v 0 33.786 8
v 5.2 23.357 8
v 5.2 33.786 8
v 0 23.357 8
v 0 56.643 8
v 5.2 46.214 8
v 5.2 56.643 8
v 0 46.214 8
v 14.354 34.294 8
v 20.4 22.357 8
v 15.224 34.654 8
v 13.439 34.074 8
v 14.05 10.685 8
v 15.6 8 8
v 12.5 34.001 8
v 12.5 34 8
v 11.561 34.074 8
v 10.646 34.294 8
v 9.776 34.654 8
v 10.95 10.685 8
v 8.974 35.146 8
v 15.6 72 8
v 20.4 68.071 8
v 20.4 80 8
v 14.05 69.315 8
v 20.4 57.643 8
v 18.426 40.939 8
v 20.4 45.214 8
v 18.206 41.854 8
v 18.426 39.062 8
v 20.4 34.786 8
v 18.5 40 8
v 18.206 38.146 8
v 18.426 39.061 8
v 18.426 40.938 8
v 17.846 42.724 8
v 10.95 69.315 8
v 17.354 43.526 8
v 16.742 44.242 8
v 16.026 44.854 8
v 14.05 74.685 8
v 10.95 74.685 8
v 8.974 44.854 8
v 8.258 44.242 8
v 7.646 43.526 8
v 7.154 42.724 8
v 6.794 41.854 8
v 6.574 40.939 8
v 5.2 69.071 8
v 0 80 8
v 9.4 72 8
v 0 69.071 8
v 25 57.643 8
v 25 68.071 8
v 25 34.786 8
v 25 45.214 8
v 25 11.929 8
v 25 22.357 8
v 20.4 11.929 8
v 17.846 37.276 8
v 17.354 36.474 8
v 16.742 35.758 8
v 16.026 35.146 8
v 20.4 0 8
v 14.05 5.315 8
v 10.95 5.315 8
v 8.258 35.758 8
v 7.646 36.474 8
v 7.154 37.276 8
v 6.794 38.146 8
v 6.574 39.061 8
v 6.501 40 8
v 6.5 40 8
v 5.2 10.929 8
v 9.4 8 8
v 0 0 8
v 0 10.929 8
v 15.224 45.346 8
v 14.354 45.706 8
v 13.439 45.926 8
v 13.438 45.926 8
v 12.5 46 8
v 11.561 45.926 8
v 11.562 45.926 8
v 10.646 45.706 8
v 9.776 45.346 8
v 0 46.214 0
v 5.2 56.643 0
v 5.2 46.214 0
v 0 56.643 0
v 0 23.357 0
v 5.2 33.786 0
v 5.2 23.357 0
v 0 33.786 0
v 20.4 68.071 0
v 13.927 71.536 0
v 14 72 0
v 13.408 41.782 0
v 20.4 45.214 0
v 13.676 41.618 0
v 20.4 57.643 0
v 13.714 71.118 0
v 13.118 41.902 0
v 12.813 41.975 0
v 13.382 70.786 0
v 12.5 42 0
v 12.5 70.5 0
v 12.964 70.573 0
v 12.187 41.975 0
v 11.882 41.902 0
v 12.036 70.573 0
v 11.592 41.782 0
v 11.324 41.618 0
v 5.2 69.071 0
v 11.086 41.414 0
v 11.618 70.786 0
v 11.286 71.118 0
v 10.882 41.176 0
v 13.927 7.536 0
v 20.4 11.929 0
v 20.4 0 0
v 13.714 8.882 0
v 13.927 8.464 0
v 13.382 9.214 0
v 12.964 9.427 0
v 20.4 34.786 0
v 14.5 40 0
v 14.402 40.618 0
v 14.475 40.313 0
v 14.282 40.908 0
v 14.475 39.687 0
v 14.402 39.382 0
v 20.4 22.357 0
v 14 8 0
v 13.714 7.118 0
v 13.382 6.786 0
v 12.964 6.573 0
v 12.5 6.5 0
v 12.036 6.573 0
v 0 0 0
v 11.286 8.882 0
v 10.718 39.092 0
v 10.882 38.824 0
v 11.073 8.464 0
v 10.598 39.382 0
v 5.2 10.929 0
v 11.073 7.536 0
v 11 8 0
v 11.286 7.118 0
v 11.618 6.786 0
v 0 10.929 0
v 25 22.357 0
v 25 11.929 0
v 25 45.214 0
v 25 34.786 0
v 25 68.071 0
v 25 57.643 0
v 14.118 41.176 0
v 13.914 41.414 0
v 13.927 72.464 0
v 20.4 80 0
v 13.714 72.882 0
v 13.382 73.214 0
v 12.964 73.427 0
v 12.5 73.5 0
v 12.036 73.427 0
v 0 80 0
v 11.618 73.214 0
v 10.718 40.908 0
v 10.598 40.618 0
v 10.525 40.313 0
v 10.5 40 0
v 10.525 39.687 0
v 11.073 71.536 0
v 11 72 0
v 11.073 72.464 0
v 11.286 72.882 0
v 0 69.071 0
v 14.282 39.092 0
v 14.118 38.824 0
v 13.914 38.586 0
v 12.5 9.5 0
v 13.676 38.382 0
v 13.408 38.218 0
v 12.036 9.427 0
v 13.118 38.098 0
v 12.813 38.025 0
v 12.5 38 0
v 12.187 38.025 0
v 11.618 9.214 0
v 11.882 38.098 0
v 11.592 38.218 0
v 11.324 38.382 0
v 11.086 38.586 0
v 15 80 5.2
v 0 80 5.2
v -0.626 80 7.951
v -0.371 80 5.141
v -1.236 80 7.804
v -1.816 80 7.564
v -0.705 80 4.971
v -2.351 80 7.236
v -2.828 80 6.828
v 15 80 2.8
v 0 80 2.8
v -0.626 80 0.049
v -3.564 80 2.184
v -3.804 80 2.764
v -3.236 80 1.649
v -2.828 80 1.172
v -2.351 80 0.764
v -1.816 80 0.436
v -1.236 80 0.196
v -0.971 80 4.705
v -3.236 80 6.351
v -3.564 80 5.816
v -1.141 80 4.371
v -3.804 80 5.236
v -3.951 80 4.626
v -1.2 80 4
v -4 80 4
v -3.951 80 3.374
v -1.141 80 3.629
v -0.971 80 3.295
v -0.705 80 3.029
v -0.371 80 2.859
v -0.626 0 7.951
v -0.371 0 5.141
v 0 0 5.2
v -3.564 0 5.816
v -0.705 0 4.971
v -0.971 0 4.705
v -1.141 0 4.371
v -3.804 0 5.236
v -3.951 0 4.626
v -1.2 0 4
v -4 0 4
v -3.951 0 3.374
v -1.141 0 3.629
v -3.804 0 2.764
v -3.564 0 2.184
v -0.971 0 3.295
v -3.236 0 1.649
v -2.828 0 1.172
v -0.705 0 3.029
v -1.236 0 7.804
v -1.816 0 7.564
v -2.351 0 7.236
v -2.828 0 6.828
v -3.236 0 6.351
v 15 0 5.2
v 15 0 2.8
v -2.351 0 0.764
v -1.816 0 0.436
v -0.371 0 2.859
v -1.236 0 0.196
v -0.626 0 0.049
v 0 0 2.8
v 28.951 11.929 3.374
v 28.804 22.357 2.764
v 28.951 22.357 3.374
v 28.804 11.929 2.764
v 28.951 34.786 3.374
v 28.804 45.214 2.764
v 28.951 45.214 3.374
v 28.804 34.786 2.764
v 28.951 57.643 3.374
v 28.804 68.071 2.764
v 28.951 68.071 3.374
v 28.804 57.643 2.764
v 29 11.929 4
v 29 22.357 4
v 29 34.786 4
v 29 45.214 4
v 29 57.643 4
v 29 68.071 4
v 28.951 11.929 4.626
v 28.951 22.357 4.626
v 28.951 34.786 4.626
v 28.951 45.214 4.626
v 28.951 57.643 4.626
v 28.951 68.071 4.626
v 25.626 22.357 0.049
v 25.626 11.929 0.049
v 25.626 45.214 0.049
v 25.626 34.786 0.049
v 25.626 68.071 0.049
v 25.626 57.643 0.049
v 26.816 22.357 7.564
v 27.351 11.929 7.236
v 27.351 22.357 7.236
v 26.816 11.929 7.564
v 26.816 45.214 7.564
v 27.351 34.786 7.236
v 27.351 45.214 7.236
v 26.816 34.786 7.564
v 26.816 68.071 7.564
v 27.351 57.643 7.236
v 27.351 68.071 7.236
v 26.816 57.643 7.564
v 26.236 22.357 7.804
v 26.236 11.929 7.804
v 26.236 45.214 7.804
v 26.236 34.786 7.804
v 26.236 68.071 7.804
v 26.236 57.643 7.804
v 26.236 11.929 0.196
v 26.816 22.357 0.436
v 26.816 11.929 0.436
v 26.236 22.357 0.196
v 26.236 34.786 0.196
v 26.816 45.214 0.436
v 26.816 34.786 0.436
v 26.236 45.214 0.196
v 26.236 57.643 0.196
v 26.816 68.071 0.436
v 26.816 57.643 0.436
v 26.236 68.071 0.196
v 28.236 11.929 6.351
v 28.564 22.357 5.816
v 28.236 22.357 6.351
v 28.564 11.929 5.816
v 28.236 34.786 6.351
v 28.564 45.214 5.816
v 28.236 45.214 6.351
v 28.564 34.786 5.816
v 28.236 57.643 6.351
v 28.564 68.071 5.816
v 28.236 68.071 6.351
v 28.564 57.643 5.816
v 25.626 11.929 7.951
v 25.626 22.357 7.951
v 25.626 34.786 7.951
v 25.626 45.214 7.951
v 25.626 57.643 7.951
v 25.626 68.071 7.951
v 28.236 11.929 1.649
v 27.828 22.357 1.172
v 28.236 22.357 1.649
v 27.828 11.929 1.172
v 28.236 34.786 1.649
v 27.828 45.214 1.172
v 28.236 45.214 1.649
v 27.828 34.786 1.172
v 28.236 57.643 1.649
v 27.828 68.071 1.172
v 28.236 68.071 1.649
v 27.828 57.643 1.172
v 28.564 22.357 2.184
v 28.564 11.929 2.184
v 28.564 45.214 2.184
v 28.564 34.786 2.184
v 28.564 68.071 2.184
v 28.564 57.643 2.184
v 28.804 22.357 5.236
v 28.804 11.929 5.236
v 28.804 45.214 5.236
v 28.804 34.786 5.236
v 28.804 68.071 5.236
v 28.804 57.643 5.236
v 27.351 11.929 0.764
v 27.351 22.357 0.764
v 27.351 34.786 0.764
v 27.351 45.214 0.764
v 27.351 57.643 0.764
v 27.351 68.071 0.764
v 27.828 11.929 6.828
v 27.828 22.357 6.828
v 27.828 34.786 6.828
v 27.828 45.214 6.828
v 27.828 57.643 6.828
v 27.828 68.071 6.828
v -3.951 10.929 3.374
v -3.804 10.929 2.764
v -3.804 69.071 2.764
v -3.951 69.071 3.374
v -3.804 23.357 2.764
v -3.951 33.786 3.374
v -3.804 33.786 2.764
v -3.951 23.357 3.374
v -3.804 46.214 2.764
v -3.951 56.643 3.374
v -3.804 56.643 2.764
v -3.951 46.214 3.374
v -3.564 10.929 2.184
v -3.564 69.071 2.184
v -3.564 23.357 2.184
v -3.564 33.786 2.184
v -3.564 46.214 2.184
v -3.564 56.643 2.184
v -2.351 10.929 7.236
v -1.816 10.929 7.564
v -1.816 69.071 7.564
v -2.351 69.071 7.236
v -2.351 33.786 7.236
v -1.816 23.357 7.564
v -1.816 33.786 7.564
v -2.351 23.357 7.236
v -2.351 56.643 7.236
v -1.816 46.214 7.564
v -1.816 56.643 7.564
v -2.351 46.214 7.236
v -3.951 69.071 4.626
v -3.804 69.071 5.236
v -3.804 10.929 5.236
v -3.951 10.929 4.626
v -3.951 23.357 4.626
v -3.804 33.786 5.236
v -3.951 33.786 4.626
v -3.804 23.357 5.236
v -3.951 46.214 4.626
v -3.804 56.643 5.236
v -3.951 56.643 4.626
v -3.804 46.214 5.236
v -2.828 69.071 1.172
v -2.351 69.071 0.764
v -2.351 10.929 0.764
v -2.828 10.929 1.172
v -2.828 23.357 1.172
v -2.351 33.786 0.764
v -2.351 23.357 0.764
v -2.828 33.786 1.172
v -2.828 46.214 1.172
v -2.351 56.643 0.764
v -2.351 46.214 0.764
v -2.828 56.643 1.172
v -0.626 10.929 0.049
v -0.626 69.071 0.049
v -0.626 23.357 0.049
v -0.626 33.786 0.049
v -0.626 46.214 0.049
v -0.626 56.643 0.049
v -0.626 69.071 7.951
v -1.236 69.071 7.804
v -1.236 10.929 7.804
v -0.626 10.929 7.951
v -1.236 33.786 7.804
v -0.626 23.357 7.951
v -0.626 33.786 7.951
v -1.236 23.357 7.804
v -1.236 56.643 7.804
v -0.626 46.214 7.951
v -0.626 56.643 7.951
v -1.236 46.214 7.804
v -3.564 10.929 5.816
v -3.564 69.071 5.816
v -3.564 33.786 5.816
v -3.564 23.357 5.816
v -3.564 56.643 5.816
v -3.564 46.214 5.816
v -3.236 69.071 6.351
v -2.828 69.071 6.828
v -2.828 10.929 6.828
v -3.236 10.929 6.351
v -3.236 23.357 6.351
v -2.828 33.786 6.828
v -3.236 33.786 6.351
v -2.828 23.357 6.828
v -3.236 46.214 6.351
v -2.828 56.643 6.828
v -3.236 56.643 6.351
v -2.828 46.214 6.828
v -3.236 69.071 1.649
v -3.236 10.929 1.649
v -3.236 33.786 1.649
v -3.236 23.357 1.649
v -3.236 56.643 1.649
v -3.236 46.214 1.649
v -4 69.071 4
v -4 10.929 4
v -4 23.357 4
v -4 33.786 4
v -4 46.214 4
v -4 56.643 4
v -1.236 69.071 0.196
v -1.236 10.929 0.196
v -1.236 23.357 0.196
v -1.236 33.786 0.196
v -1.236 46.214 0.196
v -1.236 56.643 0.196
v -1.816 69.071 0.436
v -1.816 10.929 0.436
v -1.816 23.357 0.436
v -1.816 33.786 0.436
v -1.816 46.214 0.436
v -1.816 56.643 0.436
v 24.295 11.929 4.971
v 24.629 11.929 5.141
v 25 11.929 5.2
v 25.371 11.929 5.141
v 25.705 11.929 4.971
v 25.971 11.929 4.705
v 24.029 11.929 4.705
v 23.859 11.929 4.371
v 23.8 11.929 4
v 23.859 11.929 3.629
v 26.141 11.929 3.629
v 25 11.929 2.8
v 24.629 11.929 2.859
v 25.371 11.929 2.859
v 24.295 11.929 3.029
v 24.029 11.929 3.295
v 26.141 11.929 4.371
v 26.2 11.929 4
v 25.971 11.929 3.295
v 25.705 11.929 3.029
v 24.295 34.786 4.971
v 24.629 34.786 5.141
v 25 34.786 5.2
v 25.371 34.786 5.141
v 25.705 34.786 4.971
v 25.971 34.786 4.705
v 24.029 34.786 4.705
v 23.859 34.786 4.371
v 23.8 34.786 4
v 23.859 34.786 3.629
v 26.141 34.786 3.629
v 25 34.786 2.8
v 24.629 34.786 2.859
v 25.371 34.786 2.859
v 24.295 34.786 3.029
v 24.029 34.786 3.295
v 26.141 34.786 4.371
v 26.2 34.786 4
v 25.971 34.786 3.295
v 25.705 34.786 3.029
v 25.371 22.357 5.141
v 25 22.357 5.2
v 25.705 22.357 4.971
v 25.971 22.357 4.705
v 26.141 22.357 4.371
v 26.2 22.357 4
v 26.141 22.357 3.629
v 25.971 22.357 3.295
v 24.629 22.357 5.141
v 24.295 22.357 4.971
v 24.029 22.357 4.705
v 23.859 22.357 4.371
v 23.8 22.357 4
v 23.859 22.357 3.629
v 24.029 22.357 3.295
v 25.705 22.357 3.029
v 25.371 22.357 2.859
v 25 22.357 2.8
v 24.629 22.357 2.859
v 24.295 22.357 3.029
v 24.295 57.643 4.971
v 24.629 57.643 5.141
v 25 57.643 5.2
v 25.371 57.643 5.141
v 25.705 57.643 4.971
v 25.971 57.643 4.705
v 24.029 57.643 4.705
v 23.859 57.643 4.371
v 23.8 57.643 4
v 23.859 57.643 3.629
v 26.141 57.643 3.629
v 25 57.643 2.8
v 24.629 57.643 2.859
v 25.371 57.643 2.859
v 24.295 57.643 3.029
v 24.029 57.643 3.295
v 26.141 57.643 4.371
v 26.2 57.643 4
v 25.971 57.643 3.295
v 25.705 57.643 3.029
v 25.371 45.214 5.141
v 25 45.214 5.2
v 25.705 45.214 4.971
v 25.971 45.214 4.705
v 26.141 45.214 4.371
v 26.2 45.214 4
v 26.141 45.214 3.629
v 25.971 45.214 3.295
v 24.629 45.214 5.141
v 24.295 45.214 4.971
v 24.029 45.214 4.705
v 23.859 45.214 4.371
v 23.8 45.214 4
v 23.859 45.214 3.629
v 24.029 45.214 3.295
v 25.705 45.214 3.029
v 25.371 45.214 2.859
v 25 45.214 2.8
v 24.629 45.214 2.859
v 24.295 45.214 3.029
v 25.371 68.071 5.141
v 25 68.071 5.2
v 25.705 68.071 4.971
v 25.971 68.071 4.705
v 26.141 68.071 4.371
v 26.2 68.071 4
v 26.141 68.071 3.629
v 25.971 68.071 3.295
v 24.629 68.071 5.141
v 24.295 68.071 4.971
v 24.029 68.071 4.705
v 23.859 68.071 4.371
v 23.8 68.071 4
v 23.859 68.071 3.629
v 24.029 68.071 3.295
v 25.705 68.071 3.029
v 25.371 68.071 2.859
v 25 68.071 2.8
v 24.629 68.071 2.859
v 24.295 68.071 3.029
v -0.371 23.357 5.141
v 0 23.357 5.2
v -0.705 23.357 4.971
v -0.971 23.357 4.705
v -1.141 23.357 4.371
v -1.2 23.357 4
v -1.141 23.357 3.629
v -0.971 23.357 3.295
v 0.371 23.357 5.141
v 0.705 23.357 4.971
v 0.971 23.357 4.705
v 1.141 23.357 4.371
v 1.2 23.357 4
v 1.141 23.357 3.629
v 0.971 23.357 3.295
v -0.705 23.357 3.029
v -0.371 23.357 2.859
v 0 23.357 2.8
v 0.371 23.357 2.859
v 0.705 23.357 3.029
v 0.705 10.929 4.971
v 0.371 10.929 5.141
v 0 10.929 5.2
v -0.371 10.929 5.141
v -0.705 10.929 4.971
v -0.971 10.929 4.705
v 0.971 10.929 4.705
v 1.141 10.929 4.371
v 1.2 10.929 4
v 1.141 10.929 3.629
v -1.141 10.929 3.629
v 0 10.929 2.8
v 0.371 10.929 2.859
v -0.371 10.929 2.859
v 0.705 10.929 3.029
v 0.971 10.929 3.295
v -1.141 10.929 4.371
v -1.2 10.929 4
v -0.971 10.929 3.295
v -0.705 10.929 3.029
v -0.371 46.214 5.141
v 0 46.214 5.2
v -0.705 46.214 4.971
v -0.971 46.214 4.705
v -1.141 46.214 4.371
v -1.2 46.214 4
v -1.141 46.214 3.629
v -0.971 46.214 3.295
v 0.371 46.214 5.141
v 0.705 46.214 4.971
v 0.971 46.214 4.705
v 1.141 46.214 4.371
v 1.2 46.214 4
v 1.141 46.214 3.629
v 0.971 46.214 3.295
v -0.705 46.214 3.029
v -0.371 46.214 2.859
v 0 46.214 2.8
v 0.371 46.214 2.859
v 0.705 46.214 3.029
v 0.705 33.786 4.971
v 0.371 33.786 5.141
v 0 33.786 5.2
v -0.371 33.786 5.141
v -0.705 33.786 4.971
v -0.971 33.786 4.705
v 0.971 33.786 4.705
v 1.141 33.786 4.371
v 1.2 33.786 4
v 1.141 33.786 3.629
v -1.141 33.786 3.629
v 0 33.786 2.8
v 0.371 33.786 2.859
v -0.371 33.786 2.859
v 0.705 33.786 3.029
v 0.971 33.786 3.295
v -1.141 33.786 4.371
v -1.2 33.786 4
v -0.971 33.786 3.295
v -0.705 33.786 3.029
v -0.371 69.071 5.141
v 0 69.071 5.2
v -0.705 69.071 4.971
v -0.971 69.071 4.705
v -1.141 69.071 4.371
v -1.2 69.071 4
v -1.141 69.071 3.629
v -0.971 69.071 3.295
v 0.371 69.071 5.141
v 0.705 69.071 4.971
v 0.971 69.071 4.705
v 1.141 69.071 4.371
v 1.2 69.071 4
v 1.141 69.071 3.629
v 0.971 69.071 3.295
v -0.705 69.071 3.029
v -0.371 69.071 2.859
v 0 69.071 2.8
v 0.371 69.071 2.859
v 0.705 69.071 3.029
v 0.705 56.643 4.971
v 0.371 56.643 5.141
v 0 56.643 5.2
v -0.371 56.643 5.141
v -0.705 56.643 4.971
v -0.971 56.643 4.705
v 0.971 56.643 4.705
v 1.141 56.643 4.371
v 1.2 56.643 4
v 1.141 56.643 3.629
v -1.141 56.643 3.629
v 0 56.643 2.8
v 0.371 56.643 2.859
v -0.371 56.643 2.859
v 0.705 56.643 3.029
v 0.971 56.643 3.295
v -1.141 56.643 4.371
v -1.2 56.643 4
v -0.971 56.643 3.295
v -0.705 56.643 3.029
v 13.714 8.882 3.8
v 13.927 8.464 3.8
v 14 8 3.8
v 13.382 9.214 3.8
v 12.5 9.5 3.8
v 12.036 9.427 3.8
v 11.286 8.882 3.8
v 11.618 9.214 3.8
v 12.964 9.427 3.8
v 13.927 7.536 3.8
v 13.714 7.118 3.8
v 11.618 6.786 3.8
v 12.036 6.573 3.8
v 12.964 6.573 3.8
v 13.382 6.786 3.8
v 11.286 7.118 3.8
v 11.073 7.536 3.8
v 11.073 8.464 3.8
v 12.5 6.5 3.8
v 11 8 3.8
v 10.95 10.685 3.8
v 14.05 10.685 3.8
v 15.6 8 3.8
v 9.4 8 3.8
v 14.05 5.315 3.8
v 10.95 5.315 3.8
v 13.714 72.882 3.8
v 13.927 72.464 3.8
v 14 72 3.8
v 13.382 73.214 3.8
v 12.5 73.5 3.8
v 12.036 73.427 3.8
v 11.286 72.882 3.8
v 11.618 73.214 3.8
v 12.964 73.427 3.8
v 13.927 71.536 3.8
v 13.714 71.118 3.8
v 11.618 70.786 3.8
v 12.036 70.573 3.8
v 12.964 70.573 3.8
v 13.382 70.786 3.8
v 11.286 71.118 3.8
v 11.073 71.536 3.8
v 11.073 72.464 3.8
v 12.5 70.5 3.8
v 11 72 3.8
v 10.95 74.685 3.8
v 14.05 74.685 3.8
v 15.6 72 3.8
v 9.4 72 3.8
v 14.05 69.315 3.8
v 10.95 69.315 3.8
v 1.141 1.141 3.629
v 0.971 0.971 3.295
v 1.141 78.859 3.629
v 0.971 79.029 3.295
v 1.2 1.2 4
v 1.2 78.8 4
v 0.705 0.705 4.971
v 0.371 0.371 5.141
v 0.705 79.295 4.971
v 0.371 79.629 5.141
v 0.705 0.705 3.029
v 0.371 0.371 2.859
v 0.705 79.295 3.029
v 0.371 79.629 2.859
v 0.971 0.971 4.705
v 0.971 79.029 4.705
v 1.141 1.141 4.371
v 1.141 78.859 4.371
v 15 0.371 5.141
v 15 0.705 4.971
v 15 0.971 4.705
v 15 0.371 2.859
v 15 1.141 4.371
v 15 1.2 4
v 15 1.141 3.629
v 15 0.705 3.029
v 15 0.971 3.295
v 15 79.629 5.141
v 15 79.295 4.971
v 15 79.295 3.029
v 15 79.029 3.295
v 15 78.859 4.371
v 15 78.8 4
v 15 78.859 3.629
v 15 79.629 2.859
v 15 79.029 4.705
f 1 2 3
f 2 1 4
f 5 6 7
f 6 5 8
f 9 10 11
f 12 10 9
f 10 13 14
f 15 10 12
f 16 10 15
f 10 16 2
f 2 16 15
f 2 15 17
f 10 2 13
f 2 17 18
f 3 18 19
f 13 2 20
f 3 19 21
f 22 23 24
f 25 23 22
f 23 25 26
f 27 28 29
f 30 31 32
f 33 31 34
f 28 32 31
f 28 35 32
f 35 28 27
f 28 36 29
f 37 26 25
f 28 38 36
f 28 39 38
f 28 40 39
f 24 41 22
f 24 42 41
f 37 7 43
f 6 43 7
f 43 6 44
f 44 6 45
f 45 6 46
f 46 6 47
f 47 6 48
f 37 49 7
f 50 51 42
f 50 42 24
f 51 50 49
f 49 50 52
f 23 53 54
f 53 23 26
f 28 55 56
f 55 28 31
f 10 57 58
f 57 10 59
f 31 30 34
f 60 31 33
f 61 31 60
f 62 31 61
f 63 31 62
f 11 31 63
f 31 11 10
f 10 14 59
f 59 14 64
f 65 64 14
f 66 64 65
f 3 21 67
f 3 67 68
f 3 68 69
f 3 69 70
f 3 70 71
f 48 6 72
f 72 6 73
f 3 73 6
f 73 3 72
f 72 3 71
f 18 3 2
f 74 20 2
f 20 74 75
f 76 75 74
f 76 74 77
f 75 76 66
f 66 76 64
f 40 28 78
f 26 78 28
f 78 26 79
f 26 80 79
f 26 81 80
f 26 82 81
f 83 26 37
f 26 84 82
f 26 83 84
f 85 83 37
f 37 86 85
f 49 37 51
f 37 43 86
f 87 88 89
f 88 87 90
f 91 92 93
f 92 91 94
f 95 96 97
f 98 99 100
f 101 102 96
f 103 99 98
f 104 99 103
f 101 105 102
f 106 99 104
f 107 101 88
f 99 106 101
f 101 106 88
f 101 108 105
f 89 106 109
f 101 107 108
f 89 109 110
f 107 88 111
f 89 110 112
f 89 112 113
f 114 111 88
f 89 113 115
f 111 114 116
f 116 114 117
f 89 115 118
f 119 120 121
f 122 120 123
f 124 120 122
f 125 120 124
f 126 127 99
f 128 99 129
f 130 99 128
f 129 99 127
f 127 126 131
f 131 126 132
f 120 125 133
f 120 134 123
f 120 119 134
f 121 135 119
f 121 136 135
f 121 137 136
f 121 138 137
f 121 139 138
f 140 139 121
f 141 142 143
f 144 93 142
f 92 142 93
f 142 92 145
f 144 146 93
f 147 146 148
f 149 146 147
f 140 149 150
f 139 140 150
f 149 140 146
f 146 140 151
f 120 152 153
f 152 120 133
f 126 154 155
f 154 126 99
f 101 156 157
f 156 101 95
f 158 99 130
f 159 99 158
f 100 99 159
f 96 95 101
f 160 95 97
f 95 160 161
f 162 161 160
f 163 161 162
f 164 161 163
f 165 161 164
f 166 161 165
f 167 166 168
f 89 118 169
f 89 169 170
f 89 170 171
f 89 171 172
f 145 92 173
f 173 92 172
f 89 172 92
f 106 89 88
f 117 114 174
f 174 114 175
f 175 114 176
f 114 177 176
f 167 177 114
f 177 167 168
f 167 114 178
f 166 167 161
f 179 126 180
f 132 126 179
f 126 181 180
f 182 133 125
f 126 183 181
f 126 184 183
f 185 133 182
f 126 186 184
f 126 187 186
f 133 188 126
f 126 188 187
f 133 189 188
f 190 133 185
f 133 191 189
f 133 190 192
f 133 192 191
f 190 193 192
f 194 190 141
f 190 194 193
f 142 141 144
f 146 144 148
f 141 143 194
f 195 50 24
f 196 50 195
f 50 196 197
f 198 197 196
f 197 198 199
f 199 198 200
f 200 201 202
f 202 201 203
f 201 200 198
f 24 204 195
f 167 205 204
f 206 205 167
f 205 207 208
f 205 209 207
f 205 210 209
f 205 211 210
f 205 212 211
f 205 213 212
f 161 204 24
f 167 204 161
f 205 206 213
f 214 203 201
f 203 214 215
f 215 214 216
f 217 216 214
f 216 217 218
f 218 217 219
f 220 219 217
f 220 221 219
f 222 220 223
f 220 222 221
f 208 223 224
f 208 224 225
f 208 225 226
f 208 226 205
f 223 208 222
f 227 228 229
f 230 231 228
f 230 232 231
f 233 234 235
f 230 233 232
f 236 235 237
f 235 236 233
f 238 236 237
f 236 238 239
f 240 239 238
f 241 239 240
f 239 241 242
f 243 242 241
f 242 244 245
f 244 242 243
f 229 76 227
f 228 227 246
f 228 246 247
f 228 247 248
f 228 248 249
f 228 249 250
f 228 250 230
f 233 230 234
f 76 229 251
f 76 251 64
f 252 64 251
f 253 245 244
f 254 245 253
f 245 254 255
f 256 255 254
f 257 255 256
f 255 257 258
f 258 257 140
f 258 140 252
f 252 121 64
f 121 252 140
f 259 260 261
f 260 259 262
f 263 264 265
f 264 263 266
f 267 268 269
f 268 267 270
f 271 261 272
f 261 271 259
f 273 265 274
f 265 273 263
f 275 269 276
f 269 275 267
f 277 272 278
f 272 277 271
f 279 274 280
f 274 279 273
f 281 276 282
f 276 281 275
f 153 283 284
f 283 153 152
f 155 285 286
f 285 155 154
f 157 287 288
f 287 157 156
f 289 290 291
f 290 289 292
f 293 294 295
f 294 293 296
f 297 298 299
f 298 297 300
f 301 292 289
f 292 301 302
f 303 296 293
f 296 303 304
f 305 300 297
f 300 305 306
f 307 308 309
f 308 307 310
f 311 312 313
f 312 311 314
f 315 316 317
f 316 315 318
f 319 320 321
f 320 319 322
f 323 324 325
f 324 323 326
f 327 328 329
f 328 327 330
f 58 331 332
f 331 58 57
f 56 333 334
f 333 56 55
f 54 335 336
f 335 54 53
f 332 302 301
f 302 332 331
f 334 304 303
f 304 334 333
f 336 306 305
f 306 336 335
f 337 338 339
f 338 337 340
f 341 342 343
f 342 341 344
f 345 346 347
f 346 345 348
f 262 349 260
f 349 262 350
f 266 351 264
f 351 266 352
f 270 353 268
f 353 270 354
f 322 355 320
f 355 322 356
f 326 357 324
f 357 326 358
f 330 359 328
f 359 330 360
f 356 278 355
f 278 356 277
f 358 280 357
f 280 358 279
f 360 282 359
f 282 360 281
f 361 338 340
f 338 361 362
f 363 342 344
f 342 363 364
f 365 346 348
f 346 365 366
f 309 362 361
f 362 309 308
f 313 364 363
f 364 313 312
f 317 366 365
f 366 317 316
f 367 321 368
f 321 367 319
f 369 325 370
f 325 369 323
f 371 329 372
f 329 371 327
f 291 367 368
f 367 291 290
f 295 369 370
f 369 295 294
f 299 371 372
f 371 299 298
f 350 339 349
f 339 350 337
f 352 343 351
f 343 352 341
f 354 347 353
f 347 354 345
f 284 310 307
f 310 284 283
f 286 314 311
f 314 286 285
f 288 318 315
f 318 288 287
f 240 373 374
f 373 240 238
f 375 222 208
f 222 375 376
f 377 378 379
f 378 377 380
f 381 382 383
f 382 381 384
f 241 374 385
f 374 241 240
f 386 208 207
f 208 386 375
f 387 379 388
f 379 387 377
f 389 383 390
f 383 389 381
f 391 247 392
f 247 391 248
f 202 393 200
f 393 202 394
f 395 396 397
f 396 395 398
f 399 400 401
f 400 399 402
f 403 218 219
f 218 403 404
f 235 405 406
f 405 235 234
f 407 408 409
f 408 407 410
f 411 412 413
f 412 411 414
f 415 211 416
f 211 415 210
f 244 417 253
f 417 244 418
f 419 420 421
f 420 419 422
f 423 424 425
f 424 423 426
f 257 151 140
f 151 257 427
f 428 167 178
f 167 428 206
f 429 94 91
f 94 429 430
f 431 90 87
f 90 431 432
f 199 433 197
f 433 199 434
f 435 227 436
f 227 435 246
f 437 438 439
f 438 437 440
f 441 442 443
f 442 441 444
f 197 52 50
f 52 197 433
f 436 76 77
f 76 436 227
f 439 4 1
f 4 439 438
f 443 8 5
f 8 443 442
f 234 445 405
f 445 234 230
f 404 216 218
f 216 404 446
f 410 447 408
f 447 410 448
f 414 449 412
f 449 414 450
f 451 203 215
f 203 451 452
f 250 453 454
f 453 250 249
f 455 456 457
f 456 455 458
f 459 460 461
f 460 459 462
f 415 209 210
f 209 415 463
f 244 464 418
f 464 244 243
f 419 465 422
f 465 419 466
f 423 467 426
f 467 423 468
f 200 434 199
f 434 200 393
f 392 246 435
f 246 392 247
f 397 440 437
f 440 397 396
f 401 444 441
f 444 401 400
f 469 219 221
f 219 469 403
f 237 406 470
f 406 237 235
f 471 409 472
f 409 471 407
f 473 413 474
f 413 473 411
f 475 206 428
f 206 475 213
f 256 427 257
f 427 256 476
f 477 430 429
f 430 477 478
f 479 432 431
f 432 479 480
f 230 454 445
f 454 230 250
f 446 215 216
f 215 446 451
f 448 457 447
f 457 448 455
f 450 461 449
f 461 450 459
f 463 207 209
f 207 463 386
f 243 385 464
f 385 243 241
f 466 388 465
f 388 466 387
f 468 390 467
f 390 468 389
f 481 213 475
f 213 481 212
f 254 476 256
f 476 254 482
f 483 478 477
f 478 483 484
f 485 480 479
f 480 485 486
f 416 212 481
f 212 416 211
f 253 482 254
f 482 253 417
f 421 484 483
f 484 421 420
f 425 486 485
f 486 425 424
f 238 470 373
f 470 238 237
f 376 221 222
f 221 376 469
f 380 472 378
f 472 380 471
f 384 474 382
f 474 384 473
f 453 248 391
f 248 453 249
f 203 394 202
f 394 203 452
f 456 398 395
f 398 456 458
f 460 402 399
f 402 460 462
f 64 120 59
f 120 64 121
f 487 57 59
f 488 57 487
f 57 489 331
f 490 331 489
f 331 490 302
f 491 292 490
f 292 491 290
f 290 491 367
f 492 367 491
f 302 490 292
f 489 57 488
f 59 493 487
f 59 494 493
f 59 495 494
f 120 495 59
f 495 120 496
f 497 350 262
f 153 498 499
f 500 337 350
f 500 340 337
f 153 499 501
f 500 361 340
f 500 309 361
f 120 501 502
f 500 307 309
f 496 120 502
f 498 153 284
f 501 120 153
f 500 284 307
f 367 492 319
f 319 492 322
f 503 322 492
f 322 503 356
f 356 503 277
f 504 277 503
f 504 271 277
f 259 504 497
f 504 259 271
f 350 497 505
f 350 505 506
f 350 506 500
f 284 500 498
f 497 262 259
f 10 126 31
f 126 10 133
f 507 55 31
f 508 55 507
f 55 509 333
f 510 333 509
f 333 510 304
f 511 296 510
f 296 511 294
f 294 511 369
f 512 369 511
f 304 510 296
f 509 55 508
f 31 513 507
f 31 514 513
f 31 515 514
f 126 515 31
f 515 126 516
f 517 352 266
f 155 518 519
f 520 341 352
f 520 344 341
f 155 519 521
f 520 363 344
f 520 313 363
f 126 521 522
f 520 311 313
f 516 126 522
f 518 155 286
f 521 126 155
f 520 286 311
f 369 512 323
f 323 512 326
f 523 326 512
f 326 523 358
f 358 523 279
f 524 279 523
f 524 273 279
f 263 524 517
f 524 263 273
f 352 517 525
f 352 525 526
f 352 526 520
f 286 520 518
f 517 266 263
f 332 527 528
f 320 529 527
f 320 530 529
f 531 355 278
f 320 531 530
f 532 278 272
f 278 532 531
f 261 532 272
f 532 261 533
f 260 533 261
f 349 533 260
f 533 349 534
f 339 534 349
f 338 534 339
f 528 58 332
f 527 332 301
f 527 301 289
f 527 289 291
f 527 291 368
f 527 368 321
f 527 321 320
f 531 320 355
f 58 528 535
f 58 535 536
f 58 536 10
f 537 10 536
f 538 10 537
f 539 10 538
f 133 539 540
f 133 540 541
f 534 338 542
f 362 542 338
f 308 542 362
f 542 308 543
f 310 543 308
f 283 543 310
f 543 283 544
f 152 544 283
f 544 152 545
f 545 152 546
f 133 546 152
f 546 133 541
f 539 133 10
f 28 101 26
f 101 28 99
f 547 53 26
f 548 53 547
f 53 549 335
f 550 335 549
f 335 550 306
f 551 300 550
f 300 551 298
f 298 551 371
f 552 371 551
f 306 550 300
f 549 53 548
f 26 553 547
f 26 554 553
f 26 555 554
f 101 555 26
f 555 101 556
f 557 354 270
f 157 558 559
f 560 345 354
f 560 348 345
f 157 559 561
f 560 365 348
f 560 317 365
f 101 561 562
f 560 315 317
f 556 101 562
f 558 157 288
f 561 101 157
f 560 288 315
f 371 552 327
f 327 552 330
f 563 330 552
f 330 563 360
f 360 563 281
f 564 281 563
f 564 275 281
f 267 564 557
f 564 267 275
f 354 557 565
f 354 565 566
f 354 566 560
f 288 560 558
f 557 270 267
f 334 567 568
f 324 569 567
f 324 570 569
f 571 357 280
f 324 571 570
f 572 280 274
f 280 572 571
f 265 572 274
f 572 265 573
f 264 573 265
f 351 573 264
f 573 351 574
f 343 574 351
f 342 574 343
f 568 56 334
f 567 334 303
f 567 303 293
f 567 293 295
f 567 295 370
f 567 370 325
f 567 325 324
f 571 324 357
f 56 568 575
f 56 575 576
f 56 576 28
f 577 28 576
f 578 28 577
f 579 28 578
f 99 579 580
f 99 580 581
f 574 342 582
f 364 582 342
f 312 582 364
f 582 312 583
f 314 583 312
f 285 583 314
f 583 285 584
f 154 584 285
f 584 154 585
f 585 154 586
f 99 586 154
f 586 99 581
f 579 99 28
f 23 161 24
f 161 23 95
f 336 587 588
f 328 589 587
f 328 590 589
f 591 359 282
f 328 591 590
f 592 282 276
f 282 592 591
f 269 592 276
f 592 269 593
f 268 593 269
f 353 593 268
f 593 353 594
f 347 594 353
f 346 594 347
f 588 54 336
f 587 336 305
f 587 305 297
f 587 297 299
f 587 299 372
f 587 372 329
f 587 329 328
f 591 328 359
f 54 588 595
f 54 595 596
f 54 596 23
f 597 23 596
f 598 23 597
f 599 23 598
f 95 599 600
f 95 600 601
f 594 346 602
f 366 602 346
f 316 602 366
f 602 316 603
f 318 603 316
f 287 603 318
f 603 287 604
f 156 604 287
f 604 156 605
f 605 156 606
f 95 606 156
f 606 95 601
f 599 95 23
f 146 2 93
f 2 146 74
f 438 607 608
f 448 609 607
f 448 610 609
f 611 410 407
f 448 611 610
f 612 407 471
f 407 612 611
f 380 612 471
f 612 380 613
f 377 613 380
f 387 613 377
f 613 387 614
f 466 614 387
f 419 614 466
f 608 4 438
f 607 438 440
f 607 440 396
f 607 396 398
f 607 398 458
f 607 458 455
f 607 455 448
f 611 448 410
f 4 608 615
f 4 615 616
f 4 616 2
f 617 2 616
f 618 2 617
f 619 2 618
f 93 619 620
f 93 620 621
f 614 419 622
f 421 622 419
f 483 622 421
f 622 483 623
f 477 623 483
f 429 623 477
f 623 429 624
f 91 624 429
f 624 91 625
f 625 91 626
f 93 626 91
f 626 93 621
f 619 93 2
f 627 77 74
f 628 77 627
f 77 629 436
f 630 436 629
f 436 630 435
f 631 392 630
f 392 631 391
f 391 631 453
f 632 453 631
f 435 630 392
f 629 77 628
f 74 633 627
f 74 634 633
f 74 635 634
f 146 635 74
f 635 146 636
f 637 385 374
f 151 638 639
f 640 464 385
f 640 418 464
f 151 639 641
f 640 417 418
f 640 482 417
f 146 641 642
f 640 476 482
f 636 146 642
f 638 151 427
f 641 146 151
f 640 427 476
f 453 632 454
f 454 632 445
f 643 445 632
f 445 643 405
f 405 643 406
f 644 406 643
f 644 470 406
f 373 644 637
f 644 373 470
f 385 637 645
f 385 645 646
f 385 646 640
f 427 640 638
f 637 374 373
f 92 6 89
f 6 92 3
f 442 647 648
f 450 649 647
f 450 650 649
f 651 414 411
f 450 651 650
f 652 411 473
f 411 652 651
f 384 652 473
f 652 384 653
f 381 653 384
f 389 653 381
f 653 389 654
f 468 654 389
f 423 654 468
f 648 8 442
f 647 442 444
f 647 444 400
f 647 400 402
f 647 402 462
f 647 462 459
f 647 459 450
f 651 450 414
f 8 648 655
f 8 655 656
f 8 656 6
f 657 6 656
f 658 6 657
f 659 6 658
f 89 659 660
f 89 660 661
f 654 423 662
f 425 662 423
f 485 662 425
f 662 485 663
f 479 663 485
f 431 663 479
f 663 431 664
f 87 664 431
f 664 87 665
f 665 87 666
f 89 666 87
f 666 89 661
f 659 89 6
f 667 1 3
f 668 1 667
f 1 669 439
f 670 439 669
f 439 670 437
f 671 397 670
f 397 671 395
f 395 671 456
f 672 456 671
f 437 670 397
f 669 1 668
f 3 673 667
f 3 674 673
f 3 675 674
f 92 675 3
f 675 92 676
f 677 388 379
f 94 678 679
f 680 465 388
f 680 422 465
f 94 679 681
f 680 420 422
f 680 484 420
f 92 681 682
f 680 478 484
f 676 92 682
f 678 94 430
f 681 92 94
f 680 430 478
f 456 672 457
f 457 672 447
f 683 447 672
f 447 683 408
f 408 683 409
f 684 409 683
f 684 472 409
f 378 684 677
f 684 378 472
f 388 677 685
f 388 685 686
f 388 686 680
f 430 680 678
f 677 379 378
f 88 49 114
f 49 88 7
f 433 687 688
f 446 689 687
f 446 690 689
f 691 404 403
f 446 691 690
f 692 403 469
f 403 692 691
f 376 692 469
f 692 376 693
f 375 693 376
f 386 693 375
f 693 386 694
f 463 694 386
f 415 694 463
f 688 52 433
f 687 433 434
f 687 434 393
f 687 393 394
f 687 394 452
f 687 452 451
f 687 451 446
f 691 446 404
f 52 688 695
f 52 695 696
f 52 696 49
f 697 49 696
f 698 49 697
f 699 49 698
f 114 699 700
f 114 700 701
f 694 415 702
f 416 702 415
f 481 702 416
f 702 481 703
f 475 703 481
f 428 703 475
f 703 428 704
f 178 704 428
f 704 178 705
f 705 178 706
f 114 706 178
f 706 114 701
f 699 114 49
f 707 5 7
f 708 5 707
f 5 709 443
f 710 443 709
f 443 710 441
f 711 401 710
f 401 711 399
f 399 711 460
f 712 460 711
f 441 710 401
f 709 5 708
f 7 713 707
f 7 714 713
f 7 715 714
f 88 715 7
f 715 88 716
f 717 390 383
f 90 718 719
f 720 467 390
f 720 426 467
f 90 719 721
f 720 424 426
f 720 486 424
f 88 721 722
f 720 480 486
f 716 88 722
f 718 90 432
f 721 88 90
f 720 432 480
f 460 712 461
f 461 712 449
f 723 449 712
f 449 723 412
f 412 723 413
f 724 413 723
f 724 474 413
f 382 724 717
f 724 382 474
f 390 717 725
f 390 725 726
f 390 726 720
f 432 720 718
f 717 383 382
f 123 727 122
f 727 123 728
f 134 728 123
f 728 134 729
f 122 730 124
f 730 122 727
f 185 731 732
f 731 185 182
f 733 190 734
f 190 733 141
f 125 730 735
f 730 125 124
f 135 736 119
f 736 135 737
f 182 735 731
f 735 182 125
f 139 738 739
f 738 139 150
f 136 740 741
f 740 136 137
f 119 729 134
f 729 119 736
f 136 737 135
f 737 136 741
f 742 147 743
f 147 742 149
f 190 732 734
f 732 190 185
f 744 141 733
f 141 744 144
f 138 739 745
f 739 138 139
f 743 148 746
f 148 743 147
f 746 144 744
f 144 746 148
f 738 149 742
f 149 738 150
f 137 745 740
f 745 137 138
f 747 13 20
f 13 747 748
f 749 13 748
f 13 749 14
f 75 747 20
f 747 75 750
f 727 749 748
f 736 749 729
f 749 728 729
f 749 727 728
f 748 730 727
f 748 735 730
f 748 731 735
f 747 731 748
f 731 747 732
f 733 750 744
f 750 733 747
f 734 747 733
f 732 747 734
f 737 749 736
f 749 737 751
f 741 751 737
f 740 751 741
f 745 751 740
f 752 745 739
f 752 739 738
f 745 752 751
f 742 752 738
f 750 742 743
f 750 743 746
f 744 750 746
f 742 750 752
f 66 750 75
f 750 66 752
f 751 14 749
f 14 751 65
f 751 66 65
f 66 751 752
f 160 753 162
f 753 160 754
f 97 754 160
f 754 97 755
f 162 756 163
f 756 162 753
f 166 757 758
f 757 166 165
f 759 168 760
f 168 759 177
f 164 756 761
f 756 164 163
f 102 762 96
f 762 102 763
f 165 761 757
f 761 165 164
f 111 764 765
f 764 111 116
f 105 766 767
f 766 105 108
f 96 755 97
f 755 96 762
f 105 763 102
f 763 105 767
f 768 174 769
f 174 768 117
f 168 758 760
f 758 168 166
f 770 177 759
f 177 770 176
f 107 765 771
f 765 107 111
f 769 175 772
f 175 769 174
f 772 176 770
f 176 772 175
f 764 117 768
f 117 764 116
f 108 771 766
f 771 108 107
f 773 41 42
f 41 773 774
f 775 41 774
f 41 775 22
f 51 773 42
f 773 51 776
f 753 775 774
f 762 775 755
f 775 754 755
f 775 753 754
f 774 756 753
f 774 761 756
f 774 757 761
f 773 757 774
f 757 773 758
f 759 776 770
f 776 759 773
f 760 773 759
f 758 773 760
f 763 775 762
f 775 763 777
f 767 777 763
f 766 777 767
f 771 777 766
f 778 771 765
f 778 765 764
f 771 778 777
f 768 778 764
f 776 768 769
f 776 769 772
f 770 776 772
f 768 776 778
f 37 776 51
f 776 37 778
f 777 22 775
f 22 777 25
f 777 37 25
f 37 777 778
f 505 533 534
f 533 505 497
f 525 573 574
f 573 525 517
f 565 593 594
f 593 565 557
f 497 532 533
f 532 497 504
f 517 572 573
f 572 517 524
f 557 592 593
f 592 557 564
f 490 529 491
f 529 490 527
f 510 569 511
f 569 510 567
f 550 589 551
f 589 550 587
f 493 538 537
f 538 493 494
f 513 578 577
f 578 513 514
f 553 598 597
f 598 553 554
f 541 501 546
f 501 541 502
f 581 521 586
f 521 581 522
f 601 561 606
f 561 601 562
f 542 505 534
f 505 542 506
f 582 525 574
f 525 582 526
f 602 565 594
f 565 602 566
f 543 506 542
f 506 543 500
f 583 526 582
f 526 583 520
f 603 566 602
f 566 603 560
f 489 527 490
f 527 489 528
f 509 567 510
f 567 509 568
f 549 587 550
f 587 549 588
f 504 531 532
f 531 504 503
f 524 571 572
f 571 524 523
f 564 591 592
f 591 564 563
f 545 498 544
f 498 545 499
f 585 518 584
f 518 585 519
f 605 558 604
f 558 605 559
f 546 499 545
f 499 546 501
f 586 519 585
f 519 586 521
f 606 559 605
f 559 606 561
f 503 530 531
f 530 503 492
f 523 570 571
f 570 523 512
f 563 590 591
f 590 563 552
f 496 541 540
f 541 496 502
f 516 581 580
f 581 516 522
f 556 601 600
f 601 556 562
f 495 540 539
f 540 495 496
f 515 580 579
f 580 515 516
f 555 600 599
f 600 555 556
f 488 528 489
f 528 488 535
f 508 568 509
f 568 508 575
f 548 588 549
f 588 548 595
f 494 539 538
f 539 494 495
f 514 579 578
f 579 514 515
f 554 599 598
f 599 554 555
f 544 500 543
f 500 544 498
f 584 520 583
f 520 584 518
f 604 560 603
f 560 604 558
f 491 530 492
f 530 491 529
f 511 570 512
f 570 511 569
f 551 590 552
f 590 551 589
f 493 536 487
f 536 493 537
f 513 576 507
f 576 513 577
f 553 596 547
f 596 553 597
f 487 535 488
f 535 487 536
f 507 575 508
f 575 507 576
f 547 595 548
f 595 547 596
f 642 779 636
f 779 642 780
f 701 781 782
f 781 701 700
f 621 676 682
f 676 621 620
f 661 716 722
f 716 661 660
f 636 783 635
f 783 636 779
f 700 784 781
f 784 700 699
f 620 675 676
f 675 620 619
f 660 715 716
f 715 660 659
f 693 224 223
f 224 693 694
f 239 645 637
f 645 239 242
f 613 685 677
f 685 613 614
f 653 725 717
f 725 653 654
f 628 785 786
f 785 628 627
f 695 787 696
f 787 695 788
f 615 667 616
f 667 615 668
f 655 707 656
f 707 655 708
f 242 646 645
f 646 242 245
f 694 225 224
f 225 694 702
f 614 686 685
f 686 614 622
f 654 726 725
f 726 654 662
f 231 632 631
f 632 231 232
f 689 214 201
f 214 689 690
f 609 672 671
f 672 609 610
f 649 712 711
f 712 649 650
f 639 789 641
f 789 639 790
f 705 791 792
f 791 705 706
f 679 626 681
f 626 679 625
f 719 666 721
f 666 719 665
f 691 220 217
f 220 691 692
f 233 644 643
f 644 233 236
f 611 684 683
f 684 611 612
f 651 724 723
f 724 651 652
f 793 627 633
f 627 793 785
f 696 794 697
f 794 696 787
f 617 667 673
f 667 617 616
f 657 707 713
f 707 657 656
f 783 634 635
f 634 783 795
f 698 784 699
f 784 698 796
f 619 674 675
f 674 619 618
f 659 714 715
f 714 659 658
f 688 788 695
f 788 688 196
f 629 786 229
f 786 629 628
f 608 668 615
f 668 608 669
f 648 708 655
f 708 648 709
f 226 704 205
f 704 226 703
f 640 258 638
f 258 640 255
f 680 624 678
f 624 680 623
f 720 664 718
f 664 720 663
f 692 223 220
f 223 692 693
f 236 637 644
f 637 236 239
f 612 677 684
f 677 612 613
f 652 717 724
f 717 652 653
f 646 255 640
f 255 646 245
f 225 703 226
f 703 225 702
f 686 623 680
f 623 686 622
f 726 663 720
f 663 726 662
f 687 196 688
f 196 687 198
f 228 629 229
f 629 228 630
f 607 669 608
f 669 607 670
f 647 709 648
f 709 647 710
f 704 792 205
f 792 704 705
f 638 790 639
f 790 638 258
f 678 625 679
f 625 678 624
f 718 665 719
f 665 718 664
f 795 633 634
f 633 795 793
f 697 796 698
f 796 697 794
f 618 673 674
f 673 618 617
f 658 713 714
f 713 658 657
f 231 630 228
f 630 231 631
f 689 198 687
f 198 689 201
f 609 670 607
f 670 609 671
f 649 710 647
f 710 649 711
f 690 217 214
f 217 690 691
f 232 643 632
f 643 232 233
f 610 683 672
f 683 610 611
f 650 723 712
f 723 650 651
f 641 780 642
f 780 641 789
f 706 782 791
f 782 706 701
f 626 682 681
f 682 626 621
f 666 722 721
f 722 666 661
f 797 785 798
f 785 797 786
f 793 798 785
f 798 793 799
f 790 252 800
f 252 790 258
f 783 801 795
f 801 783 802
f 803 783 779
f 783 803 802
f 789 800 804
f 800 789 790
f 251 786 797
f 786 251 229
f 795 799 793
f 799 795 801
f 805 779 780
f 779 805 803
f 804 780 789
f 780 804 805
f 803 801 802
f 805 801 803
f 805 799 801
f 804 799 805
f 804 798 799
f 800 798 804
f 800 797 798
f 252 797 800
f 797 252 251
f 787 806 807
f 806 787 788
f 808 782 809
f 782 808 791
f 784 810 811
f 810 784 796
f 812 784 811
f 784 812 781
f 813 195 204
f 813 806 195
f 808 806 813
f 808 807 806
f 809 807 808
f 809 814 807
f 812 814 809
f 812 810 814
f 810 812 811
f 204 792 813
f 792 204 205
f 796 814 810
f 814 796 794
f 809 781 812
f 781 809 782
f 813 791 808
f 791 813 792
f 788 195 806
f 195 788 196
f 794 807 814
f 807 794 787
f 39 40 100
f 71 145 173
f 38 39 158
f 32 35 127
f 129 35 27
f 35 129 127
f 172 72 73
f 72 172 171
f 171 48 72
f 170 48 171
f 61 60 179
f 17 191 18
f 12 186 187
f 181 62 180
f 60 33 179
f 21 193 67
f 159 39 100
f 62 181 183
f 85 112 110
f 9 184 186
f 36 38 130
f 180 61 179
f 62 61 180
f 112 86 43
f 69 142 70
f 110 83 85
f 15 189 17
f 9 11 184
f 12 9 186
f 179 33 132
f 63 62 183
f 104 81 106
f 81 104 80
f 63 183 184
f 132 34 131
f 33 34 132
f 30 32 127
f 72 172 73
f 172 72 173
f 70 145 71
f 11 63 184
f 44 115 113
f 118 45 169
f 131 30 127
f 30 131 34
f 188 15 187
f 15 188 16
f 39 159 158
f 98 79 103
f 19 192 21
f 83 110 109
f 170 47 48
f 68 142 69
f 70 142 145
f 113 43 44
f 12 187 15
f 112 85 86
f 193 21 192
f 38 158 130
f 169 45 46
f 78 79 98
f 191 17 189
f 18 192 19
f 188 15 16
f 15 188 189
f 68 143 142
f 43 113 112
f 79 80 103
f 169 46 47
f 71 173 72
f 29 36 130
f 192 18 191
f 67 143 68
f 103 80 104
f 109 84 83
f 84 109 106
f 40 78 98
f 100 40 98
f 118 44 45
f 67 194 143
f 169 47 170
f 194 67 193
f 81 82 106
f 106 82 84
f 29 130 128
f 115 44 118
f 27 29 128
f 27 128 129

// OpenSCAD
// file: ../basic_scad/config.scad
// Author: Mihai Oltean, www.tcreate.org, mihai.oltean@gmail.com
// More details: jenny5.org
// Source: github.com/jenny5-robot
// MIT License
//--------------------------------------------------------------

aluminium_color = "Silver";
screw_color = "LightSlateGray";
frame_color = aluminium_color;
shaft_color = "Silver";
plastic_color = "LimeGreen";
pulley_color = "DarkSlateGray";
// file: params_tracks.scad
// Author: Mihai Oltean, www.tcreate.org, mihai.oltean@gmail.com
// More details: jenny5.org
// Source: github.com/jenny5-robot
// MIT License
//--------------------------------------------------------------

track_size = [80, 25, 8];
// file: ../basic_scad/params_screws_nuts_washers.scad
// Author: Mihai Oltean, www.tcreate.org, mihai.oltean@gmail.com
// More details: jenny5.org
// Source: github.com/jenny5-robot
// MIT License
//--------------------------------------------------------------


m2_screw_radius = 1;
m2_nut_radius = 2.2;
m2_nut_height = 1.6;
m2_nut_thick = m2_nut_height;

m3_screw_radius = 1.5;
m3_nut_radius = 3.1;
m3_nut_height = 2.3;
m3_nut_thick = m3_nut_height;
m3_autolock_nut_thick = 4.2;

m4_screw_radius = 2;
m4_nut_radius = 4;
m4_auto_lock_nut_height = 5;
m4_nut_height = 3.25;
m4_nut_thick = 3.25;

m5_screw_radius = 2.5;
m5_nut_radius = 4.6;
m5_nut_height = 4;

m6_screw_radius = 3;
m6_nut_radius = 5.65;
m6_nut_thick = 5;
m6_nut_slim_thick = 3;
m6_autolock_nut_thick = 6;
m6_long_nut_thick = 9;

m8_screw_head_height = 5.7;
m8_screw_radius = 3.9;
m8_nut_small_width = 12.8;
m8_nut_radius = 7.3;
m8_slim_nut_small_width = 12.4;
m8_nut_thick = 6.5;
m8_nut_height = m8_nut_thick;
m8_slim_nut_height = 5.5;
m8_screw_head_radius = 6.5;
m8_autolock_nut_thick = 8;

m10_screw_radius = 5;
m10_nut_thick = 8;
m10_nut_radius = 9.8;

M12_screw_radius = 6;
M12_nut_thick = 8;
M12_nut_radius = 11;
M12_long_long_nut_thick = 36;
M12_long_nut_thick = 36;
M12_autolock_nut_thick = 14;

m10_long_nut_radius = 9.71;
m10_long_nut_height = 29.8;

m10_long_thick_nut_radius = 7.41;
m10_long_thick_nut_height = 30.4;

m12_plastic_nut_radius = 10.45;
m12_plastic_nut_height = 23.3;

tr12_3_nut_radius = 11;
tr12_3_nut_height = 18.1;

washer_5 = 0.97;

washer_4_12_radius = 6;
washer_4_12_external_radius = 6;
washer_4_12_thick = 1;
washer_4_thick = 1;
washer_4_12_internal_radius = 2.15;

washer_4_9_external_radius = 4.5;
washer_4_9_internal_radius = 2.15;
washer_4_9_thick = 1;

washer_6_thick = 1.7;
washer_8_thick = 1.5;
washer_5_thick = 1;

washer_10_height = 2;
washer_10_thick = 2;

washer_12_thick = 2;

washer_5_15_external_radius = 7.5;
washer_5_15_thick = 1;
washer_5_thick = 1;
washer_5_15_internal_radius = 2.65;
// file: ../basic_scad/params_basic_components.scad
// Author: Mihai Oltean, www.tcreate.org, mihai.oltean@gmail.com
// More details: jenny5.org
// Source: github.com/jenny5-robot
// MIT License
//--------------------------------------------------------------

spring_length = 20;

smooth_rod_8_radius = 4;
smooth_rod_10_radius = 5;
smooth_rod_12_radius = 6;

tolerance = 0.1;
display_tolerance = 1;

overlap_tolerance = 0.01;

wall_thick_1 = 1;
wall_thick_2 = 2;
wall_thick_3 = 3;
wall_thick_4 = 4;
wall_thick_5 = 5;
wall_thick_5_5 = 5.5;
wall_thick_6 = 6;
wall_thick_7 = 7;
wall_thick_8 = 8;
wall_thick_9 = 9;
wall_thick_10 = 10;
wall_thick_12 = 10;

tolerance_z = [0, 0, tolerance];
tolerance_x = [tolerance, 0, 0];
tolerance_y = [0, tolerance, 0];

display_tolerance_z = [0, 0, display_tolerance];
display_tolerance_x = [display_tolerance, 0, 0];
display_tolerance_y = [0, display_tolerance, 0];

display_tolerance_xz = [display_tolerance, 0, display_tolerance];
display_tolerance_xy = [display_tolerance, display_tolerance, 0];
display_tolerance_yz = [0, display_tolerance, display_tolerance];

display_tolerance_xyz = [display_tolerance, display_tolerance, display_tolerance];
// main file
// Author: Mihai Oltean, www.tcreate.org, mihai.oltean@gmail.com
// More details: jenny5.org
// Source: github.com/jenny5-robot
// MIT License
//--------------------------------------------------------------

include <../basic_scad/params_basic_components.scad>
include <../basic_scad/params_screws_nuts_washers.scad>
use <../basic_scad/screws_nuts_washers.scad>
include <params_tracks.scad>
include <../basic_scad/config.scad>

//--------------------------------------------------------------------
module track(length = 25, width = 80, height = 8)
{
    togue_width = width / 7;
    
    hole_radius = 1.2;
    togue_tolerance = 1.2;
    togue_width_tolerance = 0.5;

    big_interior_hole_size = 10;
    small_interior_hole_size = big_interior_hole_size - height;

  union(){
	difference(){
		union(){
			color (plastic_color){ 
                cube(size=[length, width, height], center = false);
                rotate([-90,0,0]) translate([length, -height / 2, 0]) cylinder(h = width, r = height / 2, $fn = 40, center = false);
                rotate([-90,0,0]) translate([0,-height / 2, 0]) cylinder(h=width, r = height / 2, $fn = 40, center = false);
            }
		}

        // holes for rubber band
        translate ([length / 2, 8, 0] - display_tolerance_z) cylinder (h = height + 2 * display_tolerance, r = m3_screw_radius, $fn = 20);
        translate ([length / 2, 8, height - m3_autolock_nut_thick]) cylinder (h = height + display_tolerance, r = m3_nut_radius, $fn = 6);
// other side
        translate ([length / 2, width - 8, 0] - display_tolerance_z) cylinder (h = height + 2 * display_tolerance, r = m3_screw_radius, $fn = 20);
        translate ([length / 2, width - 8, height - m3_autolock_nut_thick]) cylinder (h = height + display_tolerance, r = m3_nut_radius, $fn = 6);
        
        
// holes for rods for connecting to the other track
		rotate([-90, 0, 0]) translate([length, -height / 2, 0] - display_tolerance_z) cylinder(h = width + 2 * display_tolerance, r = hole_radius, $fn = 20, center = false);
		rotate([-90, 0, 0]) translate([0, -height / 2, 0] - display_tolerance_z) cylinder(h = width + 2 * display_tolerance, r = hole_radius, $fn = 20, center = false);
        
        // wire stopper
        translate ([0, 0, height / 2]) rotate ([0, 90, 0]) cylinder (h = 15, r = hole_radius, $fn = 20);
        translate ([0, width, height / 2]) rotate ([0, 90, 0]) cylinder (h = 15, r = hole_radius, $fn = 20);
// front
// center
        right_side_ears_count = 4;
for (i = [0 : right_side_ears_count - 1])
        translate([length - height / 2 - togue_tolerance / 2, togue_width * 2 * i - togue_width_tolerance, 0] - display_tolerance_z) cube([height + togue_tolerance, togue_width + 2 * togue_width_tolerance , height + 2 * display_tolerance], center = false);

// the other side

        left_side_ears_count = 3;
for (i = [0 : left_side_ears_count - 1])
		translate([-height / 2, togue_width * (2 * i + 1) - togue_width_tolerance, 0] - display_tolerance_z) cube([height + togue_tolerance, togue_width + 2 * togue_width_tolerance, height] + 2 * display_tolerance_z, center = false);


// circular middle holes for wheel bumps
        translate([length / 2, width / 2, 0]) cylinder(h = height + 0.001, r1 = 2, r2 = 6, $fn = 40);
        translate([length / 2, width / 2, 0] - display_tolerance_z) cylinder(h = 2 * display_tolerance, r = 2, $fn = 40);
	}
  }
}
//--------------------------------------------------------------------
module tracks_on_circle(num_max_tracks, wheel_radius, start_angle = 0, num_tracks)
{
  step = 360 / num_max_tracks;
    
    for (i = [0 : num_tracks - 1]){
        angle = i * step;  
        rotate([0, 0, start_angle])
        translate ([wheel_radius * sin(angle), wheel_radius * cos(angle), 0]) 
            
        rotate ([0, 0, -angle]) 
                rotate ([90, 0, 0]) 
                    translate ([-track_size[1]/2, -track_size[0] / 2, -track_size[2]]) track(track_size[1], track_size[0], track_size[2]);
    }
}
//--------------------------------------------------------------------
module string_of_tracks (num_tracks)
{
    for (i = [0 : num_tracks - 1]){
        translate ([i * 25, 0, 0]) track(track_size[1], track_size[0], track_size[2]);
    }
}
//--------------------------------------------------------------------
track(length = 25, width = 80, height = 8);

//tracks_on_circle(16, 58.8, 90, 10);

//tracks_on_circle(6, 17.7, 90, 6);

//string_of_tracks (10);
